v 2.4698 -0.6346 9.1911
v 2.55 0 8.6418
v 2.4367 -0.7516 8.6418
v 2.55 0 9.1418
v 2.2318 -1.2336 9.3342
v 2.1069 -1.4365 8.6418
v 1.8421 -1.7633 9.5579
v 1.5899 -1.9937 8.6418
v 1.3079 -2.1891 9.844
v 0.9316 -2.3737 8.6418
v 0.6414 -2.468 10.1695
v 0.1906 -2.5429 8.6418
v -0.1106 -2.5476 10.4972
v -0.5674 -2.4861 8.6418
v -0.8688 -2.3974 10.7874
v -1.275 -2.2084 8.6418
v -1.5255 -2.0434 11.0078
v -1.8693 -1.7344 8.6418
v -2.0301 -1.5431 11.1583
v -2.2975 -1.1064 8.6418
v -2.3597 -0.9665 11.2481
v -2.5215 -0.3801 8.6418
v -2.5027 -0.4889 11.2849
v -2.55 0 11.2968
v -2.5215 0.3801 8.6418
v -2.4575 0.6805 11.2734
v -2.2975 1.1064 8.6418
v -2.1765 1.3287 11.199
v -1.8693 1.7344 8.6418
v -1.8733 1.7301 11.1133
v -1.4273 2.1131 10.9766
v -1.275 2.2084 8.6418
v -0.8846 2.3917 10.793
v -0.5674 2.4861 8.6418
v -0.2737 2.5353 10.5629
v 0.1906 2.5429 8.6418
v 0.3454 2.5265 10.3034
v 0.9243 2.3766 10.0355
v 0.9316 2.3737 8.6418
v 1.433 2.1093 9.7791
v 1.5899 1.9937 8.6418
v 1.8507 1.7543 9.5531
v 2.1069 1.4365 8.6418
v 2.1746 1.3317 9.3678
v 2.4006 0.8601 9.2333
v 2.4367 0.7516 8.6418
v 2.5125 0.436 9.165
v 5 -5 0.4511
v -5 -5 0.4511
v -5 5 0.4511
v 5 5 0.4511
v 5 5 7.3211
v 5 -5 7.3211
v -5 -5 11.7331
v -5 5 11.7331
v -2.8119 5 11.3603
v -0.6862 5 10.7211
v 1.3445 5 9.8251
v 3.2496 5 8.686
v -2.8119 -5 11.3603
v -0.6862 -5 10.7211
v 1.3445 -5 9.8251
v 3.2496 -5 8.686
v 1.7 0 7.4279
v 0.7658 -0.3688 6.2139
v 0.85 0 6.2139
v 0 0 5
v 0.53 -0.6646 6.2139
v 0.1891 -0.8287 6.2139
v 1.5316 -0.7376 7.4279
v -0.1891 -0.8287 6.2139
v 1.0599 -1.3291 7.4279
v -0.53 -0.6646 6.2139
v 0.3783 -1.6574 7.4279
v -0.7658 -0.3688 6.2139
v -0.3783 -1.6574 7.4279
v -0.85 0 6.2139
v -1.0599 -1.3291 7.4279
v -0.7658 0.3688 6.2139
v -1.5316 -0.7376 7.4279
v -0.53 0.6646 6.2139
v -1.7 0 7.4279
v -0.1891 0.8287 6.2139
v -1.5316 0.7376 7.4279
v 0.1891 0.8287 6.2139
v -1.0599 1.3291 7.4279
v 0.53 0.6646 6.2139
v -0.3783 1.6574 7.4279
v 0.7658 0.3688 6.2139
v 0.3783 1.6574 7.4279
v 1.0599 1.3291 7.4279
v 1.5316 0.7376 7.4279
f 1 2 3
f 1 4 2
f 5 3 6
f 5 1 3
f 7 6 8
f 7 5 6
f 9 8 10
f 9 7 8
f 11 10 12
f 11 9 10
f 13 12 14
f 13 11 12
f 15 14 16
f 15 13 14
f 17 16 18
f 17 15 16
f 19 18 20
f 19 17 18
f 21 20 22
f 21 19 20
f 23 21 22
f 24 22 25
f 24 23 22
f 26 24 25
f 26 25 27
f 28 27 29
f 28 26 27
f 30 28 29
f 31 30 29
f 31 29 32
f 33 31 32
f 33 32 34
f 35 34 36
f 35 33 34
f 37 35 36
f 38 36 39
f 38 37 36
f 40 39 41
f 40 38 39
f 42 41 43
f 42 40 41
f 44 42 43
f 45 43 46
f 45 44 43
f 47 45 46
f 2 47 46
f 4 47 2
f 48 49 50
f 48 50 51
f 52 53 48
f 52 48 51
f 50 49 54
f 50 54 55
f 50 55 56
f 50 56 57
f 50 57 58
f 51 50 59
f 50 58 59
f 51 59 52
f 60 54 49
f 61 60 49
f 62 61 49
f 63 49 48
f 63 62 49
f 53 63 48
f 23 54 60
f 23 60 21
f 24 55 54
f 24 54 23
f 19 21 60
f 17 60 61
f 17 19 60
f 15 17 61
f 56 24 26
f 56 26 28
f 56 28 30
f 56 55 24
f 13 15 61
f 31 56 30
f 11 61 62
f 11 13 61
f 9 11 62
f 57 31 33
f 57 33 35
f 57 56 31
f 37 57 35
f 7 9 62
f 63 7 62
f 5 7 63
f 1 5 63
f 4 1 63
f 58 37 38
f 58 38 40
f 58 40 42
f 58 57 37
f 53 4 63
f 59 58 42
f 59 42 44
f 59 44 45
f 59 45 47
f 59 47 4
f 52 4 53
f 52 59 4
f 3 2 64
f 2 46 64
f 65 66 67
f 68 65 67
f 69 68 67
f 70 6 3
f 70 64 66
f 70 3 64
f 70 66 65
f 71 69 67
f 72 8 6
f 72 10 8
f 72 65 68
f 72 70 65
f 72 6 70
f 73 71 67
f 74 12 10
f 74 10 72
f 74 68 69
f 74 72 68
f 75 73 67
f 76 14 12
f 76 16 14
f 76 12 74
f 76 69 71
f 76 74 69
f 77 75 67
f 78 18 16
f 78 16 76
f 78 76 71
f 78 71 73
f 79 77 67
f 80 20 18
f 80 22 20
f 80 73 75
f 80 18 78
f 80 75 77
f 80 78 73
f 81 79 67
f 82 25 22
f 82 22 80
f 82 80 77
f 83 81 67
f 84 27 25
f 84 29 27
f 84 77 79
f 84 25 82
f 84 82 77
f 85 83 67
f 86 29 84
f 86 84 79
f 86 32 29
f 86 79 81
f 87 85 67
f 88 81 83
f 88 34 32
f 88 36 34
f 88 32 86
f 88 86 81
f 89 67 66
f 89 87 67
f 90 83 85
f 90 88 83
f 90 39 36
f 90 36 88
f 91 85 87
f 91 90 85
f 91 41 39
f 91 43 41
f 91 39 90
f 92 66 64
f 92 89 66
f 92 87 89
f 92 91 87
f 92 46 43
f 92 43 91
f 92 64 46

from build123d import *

# Parameters (mm, degrees)
F0_W          = 10
F0_H          = 10
F1_DEPTH      = 25
F1_DEPTH_BACK = 5
F4_W          = 10
F4_H          = 5.4510665399
F5_DEPTH      = 25
F5_DEPTH_BACK = 25


with BuildPart() as f1:
    # F0 (on Top) → F1 (new body, two sides)
    with BuildSketch(Plane.XY) as f1_sk:
        Rectangle(F0_W, F0_H)
    extrude(amount=F1_DEPTH)
    extrude(f1_sk.sketch, amount=-F1_DEPTH_BACK)

    # F2 (on Front) → F3 (revolve, cut)
    with BuildSketch(Plane.XZ):
        Polygon((2.55, 8.6417774172), (2.55, 25), (0, 25), (0, 5), align=None)
    revolve(axis=Axis((0, 0, 15), (0, 0, -1)), mode=Mode.SUBTRACT)

    # F4 (on Front) → F5 (cut, two sides)
    with BuildSketch(Plane.XZ) as f5_sk:
        with BuildLine():
            ThreePointArc((-5, 11.7330665399), (0.3429792874, 10.3044447979), (5, 7.3210665399))
            Line((5, 7.3210665399), (5, 25))
            Line((5, 25), (-5, 25))
            Line((-5, 25), (-5, 11.7330665399))
        make_face()
        with Locations((0, -2.2744667301)):
            Rectangle(F4_W, F4_H)
    extrude(amount=-F5_DEPTH, mode=Mode.SUBTRACT)
    extrude(f5_sk.sketch, amount=F5_DEPTH_BACK, mode=Mode.SUBTRACT)


solid = f1.part
